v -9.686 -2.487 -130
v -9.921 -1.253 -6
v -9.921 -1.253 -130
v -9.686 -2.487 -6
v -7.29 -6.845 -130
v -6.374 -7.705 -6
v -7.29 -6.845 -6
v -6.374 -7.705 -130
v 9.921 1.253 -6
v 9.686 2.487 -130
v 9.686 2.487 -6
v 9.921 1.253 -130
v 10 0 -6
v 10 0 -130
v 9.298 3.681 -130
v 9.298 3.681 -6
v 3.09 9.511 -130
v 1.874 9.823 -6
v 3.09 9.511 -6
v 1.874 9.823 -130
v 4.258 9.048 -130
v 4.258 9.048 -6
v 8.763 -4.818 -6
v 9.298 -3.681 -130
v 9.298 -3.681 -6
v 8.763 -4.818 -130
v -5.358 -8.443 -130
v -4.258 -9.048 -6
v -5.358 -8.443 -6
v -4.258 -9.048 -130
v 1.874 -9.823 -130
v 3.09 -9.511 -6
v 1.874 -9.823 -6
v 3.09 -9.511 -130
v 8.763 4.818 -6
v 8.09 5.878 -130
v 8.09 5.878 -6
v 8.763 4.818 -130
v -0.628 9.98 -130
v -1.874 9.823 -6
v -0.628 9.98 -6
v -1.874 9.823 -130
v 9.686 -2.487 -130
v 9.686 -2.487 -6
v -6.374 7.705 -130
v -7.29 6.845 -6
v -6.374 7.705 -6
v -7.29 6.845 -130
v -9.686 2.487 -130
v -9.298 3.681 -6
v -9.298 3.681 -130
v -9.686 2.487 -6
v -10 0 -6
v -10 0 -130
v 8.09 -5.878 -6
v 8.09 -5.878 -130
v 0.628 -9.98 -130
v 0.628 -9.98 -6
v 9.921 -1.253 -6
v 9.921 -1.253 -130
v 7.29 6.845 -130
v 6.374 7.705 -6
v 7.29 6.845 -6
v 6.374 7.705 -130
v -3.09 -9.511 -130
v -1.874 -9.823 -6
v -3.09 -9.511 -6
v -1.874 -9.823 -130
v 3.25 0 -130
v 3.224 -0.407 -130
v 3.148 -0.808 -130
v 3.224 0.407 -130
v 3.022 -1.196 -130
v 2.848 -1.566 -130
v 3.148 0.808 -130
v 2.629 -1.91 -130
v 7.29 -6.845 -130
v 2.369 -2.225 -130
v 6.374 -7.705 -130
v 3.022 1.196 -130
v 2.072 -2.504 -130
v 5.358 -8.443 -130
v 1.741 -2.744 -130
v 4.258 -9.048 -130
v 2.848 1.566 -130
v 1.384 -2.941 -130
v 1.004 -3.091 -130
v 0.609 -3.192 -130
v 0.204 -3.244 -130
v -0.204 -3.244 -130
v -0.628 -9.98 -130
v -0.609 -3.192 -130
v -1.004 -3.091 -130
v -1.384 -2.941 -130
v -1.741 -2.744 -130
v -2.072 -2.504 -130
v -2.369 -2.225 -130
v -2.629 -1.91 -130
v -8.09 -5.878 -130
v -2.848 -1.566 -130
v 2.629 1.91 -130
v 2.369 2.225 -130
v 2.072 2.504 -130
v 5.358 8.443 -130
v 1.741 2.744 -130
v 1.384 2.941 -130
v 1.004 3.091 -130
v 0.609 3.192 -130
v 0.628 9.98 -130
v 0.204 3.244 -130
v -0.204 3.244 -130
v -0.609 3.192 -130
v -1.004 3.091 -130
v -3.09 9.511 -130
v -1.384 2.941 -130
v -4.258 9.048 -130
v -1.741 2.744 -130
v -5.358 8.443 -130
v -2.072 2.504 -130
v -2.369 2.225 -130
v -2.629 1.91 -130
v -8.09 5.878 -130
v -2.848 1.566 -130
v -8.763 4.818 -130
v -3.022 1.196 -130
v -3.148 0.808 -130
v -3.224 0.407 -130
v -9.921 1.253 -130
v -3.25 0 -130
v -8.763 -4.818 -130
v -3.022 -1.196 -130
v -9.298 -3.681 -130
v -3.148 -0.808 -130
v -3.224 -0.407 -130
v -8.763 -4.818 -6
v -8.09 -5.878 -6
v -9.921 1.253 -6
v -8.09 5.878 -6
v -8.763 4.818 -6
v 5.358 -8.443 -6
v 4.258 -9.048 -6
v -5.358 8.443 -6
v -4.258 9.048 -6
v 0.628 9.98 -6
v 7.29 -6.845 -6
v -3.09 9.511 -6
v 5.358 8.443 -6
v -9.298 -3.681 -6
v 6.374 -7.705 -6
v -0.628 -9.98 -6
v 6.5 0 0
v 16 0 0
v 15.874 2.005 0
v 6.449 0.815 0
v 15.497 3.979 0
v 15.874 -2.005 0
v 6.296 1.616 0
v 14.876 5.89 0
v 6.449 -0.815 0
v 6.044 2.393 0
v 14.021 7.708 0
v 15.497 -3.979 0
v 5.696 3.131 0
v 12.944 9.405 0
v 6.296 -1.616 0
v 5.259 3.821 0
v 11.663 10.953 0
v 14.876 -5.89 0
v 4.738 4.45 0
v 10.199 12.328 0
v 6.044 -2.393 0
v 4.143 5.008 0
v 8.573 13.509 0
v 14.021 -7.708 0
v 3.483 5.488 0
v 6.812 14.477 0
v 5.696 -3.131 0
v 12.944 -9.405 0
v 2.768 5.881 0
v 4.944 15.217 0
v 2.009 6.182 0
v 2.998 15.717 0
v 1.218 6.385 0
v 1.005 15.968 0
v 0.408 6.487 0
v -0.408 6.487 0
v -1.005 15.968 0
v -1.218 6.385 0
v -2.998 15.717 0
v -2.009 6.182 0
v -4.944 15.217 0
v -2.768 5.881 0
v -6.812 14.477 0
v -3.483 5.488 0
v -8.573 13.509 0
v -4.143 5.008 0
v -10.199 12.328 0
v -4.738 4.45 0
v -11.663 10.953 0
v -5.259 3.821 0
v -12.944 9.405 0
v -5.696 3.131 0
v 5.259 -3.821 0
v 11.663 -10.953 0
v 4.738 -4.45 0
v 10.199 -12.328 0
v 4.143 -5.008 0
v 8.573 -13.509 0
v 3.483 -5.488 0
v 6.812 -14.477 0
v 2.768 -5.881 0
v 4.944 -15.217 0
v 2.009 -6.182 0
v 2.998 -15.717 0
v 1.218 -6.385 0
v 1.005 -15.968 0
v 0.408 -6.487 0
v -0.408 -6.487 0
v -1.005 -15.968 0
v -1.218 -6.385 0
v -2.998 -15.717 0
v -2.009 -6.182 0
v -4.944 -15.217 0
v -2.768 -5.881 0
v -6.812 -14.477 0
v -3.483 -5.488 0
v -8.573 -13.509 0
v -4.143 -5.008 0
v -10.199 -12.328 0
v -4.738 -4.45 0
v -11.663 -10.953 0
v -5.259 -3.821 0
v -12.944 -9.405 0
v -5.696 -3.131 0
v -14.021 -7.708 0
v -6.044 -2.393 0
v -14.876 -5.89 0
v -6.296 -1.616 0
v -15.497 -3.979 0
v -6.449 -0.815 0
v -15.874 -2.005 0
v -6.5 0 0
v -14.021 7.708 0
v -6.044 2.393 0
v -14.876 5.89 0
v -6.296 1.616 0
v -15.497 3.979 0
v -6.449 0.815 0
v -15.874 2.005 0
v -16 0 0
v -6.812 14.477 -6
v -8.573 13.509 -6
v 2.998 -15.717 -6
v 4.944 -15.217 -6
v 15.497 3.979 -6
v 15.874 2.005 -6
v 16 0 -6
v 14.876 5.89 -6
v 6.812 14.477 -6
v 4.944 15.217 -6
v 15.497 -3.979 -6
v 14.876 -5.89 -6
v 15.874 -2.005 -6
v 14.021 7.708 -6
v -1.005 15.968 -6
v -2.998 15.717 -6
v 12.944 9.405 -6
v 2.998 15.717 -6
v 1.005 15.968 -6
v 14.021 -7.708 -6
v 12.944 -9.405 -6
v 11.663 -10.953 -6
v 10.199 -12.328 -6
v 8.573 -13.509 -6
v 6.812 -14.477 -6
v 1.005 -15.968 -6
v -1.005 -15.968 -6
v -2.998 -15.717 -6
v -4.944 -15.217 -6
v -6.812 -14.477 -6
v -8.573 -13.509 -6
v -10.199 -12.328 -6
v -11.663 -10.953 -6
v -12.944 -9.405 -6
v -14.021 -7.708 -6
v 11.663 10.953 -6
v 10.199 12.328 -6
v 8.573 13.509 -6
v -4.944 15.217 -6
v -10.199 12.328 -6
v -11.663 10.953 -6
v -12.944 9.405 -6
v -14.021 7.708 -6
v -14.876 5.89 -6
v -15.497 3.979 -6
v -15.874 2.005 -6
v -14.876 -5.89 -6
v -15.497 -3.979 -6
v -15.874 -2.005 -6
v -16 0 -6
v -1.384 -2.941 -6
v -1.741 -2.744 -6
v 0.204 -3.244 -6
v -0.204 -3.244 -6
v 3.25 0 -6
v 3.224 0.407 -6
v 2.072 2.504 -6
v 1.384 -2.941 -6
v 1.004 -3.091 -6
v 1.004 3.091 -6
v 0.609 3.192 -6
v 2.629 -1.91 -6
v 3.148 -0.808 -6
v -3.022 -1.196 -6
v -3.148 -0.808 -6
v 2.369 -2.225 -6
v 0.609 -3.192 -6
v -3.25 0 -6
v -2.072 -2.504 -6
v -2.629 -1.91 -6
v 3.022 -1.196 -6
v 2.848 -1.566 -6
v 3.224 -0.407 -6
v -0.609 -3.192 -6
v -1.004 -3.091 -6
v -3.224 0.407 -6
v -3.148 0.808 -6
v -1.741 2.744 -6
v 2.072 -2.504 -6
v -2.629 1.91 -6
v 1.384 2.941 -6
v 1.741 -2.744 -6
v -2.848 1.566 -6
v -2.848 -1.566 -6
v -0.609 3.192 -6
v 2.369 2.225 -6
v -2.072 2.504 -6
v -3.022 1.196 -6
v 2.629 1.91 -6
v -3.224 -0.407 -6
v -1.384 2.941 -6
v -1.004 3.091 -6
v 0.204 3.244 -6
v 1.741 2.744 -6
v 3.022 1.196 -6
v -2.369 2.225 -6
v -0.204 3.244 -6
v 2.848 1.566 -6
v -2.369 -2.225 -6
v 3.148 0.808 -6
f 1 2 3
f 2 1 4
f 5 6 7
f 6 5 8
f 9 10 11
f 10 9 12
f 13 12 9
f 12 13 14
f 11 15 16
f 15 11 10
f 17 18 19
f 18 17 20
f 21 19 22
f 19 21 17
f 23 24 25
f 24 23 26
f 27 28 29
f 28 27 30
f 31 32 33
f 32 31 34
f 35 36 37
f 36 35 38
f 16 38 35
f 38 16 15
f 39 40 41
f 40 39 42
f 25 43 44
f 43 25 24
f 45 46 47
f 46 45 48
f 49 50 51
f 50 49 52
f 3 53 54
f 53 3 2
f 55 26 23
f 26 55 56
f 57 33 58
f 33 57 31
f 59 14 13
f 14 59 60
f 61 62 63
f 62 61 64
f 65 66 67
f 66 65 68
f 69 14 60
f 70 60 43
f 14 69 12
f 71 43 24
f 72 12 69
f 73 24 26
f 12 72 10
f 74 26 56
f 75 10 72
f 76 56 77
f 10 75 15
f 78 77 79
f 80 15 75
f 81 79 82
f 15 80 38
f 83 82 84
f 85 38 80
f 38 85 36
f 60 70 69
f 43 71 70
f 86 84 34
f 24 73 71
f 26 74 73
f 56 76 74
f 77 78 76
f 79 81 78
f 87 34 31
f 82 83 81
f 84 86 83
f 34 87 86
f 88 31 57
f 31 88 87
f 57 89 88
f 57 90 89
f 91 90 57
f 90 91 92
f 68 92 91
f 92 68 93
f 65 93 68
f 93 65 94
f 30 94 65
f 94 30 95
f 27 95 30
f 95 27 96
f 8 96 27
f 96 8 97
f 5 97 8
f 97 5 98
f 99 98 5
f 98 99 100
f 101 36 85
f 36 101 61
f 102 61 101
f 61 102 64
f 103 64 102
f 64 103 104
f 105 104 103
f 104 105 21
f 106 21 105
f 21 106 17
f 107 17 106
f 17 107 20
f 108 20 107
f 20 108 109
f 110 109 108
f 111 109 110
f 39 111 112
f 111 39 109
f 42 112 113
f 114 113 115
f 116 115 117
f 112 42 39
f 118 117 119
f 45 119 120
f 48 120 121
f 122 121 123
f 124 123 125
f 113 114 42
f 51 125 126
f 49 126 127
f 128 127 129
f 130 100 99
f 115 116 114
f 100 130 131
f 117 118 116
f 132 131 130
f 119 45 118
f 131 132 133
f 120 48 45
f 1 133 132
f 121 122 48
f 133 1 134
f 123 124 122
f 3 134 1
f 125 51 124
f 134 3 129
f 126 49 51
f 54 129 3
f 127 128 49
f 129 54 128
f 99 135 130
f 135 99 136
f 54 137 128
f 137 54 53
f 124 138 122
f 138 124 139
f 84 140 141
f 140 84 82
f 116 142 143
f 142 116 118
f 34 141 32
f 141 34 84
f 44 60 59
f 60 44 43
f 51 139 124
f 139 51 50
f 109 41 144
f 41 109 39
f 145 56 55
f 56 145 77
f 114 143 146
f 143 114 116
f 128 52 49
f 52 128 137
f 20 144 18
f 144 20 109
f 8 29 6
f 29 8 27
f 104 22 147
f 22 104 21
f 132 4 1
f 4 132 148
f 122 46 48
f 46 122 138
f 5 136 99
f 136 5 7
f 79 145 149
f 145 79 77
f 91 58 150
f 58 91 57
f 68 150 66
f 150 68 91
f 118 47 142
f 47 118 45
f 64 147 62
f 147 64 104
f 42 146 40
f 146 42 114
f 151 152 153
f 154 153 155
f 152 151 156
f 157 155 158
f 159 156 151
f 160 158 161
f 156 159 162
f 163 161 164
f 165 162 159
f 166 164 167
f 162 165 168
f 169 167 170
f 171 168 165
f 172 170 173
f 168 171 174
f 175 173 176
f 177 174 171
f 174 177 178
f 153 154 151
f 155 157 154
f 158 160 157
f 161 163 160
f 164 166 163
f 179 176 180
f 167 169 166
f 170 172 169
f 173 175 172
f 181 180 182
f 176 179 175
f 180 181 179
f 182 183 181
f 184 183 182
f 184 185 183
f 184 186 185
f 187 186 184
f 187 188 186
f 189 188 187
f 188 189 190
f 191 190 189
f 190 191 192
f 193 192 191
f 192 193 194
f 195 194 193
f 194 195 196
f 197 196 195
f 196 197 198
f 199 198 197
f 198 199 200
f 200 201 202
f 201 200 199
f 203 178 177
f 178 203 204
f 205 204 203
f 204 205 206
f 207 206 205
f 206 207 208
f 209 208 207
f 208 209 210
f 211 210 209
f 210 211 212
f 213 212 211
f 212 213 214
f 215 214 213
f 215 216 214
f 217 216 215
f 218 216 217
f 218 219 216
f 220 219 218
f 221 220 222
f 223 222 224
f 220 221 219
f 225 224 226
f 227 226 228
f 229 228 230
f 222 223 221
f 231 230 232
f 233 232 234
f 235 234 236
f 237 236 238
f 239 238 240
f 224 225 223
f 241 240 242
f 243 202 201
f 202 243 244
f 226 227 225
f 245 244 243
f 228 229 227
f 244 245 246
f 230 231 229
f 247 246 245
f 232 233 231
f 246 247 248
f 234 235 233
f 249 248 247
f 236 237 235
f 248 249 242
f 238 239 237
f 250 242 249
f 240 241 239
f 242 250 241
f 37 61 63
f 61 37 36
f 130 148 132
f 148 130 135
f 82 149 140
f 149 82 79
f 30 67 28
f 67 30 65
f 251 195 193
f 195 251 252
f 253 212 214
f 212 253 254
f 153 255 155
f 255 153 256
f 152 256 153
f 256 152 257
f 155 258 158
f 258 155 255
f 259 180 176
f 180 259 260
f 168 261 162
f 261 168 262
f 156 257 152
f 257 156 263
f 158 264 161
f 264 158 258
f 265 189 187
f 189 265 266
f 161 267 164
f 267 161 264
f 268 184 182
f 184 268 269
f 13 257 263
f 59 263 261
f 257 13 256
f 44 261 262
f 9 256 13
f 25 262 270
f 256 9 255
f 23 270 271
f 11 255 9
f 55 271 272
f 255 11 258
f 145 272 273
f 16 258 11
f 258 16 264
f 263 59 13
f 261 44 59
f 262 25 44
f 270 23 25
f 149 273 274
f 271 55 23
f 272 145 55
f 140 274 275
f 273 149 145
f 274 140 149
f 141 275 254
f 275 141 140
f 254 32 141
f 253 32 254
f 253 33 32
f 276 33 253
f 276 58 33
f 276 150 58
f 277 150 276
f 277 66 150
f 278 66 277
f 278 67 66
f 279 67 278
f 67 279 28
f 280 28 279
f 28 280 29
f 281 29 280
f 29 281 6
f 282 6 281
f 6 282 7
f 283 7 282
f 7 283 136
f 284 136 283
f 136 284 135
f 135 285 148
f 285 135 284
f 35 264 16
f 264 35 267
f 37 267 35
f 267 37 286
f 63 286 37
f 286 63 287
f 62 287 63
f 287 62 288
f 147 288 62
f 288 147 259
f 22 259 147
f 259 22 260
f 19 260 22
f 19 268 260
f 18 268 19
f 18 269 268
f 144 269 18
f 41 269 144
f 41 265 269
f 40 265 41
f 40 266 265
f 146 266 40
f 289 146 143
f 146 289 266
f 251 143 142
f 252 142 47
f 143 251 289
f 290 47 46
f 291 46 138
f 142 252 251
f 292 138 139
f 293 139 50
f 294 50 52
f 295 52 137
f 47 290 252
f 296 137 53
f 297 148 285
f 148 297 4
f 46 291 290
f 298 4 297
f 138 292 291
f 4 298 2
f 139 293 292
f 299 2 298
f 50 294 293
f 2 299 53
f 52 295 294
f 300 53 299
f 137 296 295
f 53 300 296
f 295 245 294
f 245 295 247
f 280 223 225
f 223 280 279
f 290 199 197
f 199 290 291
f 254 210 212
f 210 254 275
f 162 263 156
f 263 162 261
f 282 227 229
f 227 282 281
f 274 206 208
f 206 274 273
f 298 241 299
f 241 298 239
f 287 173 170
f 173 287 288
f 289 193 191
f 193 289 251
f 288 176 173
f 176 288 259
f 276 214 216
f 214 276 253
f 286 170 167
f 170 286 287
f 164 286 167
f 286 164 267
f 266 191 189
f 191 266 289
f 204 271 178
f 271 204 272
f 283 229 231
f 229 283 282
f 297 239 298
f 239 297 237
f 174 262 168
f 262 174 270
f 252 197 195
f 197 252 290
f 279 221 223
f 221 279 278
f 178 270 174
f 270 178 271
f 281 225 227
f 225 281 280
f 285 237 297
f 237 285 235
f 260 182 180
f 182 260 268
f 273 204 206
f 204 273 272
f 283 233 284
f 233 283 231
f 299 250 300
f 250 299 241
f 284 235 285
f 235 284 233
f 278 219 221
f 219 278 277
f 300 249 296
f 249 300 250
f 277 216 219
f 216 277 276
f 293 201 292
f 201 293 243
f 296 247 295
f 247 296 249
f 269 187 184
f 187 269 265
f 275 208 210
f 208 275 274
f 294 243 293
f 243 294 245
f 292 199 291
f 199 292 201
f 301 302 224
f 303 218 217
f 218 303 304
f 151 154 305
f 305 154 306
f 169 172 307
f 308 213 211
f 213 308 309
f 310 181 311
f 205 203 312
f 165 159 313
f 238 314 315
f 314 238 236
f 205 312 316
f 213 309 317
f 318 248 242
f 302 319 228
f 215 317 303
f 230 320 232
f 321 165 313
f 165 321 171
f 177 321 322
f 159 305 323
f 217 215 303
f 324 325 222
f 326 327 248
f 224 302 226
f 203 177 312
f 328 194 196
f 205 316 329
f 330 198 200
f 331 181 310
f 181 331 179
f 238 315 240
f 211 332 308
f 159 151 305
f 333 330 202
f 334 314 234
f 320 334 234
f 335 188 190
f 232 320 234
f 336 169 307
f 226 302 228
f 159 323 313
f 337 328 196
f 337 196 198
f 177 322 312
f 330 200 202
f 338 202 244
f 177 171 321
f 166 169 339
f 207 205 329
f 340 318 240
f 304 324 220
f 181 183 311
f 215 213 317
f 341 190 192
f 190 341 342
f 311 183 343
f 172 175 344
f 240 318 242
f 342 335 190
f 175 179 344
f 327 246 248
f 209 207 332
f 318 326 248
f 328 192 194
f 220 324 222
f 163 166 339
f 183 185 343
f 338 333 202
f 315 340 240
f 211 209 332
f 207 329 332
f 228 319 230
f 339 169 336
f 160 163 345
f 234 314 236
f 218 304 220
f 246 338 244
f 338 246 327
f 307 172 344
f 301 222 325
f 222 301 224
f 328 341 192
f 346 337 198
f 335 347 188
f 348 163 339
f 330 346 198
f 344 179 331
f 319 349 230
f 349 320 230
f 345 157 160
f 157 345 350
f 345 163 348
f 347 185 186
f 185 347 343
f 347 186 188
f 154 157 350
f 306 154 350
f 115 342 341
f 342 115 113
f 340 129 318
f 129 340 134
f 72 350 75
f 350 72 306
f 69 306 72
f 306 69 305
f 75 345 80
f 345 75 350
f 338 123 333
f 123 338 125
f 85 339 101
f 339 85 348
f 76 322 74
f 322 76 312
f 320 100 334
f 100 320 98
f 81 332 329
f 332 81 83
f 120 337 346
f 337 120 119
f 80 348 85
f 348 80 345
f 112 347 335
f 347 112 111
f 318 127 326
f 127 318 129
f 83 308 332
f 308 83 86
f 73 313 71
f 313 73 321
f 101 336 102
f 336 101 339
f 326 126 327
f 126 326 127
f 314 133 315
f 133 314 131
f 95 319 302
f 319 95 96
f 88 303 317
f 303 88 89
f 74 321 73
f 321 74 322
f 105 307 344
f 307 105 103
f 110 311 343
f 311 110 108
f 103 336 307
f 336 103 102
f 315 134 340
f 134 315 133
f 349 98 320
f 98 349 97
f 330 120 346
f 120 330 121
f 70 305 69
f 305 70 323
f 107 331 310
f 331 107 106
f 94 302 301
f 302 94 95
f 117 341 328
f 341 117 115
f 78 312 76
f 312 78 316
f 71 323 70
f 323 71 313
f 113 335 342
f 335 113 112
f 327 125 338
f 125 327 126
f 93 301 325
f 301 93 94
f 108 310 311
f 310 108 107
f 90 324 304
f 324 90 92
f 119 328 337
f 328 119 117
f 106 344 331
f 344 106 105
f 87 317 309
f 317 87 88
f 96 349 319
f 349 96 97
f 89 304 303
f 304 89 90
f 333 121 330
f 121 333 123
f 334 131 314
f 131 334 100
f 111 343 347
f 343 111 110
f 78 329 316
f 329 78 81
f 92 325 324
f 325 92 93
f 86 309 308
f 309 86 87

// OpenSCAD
$fn = 50;


difference() {
	union() {
		translate(v = [0, 0, -130.0000000000]) {
			cylinder(h = 130, r = 10.0000000000);
		}
		translate(v = [0, 0, -6.0000000000]) {
			cylinder(h = 6, r = 16.0000000000);
		}
	}
	union() {
		translate(v = [0, 0, 0]) {
			rotate(a = [0, 0, 0]) {
				difference() {
					union() {
						#translate(v = [0, 0, -130.0000000000]) {
							cylinder(h = 130, r = 2.2500000000);
						}
						#translate(v = [0, 0, -6]) {
							cylinder(h = 6, r1 = 3.2500000000, r2 = 6.5000000000);
						}
						#translate(v = [0, 0, -130.0000000000]) {
							cylinder(h = 130, r = 3.2500000000);
						}
						#translate(v = [0, 0, -130.0000000000]) {
							cylinder(h = 130, r = 2.2500000000);
						}
					}
					union();
				}
			}
		}
	}
}
